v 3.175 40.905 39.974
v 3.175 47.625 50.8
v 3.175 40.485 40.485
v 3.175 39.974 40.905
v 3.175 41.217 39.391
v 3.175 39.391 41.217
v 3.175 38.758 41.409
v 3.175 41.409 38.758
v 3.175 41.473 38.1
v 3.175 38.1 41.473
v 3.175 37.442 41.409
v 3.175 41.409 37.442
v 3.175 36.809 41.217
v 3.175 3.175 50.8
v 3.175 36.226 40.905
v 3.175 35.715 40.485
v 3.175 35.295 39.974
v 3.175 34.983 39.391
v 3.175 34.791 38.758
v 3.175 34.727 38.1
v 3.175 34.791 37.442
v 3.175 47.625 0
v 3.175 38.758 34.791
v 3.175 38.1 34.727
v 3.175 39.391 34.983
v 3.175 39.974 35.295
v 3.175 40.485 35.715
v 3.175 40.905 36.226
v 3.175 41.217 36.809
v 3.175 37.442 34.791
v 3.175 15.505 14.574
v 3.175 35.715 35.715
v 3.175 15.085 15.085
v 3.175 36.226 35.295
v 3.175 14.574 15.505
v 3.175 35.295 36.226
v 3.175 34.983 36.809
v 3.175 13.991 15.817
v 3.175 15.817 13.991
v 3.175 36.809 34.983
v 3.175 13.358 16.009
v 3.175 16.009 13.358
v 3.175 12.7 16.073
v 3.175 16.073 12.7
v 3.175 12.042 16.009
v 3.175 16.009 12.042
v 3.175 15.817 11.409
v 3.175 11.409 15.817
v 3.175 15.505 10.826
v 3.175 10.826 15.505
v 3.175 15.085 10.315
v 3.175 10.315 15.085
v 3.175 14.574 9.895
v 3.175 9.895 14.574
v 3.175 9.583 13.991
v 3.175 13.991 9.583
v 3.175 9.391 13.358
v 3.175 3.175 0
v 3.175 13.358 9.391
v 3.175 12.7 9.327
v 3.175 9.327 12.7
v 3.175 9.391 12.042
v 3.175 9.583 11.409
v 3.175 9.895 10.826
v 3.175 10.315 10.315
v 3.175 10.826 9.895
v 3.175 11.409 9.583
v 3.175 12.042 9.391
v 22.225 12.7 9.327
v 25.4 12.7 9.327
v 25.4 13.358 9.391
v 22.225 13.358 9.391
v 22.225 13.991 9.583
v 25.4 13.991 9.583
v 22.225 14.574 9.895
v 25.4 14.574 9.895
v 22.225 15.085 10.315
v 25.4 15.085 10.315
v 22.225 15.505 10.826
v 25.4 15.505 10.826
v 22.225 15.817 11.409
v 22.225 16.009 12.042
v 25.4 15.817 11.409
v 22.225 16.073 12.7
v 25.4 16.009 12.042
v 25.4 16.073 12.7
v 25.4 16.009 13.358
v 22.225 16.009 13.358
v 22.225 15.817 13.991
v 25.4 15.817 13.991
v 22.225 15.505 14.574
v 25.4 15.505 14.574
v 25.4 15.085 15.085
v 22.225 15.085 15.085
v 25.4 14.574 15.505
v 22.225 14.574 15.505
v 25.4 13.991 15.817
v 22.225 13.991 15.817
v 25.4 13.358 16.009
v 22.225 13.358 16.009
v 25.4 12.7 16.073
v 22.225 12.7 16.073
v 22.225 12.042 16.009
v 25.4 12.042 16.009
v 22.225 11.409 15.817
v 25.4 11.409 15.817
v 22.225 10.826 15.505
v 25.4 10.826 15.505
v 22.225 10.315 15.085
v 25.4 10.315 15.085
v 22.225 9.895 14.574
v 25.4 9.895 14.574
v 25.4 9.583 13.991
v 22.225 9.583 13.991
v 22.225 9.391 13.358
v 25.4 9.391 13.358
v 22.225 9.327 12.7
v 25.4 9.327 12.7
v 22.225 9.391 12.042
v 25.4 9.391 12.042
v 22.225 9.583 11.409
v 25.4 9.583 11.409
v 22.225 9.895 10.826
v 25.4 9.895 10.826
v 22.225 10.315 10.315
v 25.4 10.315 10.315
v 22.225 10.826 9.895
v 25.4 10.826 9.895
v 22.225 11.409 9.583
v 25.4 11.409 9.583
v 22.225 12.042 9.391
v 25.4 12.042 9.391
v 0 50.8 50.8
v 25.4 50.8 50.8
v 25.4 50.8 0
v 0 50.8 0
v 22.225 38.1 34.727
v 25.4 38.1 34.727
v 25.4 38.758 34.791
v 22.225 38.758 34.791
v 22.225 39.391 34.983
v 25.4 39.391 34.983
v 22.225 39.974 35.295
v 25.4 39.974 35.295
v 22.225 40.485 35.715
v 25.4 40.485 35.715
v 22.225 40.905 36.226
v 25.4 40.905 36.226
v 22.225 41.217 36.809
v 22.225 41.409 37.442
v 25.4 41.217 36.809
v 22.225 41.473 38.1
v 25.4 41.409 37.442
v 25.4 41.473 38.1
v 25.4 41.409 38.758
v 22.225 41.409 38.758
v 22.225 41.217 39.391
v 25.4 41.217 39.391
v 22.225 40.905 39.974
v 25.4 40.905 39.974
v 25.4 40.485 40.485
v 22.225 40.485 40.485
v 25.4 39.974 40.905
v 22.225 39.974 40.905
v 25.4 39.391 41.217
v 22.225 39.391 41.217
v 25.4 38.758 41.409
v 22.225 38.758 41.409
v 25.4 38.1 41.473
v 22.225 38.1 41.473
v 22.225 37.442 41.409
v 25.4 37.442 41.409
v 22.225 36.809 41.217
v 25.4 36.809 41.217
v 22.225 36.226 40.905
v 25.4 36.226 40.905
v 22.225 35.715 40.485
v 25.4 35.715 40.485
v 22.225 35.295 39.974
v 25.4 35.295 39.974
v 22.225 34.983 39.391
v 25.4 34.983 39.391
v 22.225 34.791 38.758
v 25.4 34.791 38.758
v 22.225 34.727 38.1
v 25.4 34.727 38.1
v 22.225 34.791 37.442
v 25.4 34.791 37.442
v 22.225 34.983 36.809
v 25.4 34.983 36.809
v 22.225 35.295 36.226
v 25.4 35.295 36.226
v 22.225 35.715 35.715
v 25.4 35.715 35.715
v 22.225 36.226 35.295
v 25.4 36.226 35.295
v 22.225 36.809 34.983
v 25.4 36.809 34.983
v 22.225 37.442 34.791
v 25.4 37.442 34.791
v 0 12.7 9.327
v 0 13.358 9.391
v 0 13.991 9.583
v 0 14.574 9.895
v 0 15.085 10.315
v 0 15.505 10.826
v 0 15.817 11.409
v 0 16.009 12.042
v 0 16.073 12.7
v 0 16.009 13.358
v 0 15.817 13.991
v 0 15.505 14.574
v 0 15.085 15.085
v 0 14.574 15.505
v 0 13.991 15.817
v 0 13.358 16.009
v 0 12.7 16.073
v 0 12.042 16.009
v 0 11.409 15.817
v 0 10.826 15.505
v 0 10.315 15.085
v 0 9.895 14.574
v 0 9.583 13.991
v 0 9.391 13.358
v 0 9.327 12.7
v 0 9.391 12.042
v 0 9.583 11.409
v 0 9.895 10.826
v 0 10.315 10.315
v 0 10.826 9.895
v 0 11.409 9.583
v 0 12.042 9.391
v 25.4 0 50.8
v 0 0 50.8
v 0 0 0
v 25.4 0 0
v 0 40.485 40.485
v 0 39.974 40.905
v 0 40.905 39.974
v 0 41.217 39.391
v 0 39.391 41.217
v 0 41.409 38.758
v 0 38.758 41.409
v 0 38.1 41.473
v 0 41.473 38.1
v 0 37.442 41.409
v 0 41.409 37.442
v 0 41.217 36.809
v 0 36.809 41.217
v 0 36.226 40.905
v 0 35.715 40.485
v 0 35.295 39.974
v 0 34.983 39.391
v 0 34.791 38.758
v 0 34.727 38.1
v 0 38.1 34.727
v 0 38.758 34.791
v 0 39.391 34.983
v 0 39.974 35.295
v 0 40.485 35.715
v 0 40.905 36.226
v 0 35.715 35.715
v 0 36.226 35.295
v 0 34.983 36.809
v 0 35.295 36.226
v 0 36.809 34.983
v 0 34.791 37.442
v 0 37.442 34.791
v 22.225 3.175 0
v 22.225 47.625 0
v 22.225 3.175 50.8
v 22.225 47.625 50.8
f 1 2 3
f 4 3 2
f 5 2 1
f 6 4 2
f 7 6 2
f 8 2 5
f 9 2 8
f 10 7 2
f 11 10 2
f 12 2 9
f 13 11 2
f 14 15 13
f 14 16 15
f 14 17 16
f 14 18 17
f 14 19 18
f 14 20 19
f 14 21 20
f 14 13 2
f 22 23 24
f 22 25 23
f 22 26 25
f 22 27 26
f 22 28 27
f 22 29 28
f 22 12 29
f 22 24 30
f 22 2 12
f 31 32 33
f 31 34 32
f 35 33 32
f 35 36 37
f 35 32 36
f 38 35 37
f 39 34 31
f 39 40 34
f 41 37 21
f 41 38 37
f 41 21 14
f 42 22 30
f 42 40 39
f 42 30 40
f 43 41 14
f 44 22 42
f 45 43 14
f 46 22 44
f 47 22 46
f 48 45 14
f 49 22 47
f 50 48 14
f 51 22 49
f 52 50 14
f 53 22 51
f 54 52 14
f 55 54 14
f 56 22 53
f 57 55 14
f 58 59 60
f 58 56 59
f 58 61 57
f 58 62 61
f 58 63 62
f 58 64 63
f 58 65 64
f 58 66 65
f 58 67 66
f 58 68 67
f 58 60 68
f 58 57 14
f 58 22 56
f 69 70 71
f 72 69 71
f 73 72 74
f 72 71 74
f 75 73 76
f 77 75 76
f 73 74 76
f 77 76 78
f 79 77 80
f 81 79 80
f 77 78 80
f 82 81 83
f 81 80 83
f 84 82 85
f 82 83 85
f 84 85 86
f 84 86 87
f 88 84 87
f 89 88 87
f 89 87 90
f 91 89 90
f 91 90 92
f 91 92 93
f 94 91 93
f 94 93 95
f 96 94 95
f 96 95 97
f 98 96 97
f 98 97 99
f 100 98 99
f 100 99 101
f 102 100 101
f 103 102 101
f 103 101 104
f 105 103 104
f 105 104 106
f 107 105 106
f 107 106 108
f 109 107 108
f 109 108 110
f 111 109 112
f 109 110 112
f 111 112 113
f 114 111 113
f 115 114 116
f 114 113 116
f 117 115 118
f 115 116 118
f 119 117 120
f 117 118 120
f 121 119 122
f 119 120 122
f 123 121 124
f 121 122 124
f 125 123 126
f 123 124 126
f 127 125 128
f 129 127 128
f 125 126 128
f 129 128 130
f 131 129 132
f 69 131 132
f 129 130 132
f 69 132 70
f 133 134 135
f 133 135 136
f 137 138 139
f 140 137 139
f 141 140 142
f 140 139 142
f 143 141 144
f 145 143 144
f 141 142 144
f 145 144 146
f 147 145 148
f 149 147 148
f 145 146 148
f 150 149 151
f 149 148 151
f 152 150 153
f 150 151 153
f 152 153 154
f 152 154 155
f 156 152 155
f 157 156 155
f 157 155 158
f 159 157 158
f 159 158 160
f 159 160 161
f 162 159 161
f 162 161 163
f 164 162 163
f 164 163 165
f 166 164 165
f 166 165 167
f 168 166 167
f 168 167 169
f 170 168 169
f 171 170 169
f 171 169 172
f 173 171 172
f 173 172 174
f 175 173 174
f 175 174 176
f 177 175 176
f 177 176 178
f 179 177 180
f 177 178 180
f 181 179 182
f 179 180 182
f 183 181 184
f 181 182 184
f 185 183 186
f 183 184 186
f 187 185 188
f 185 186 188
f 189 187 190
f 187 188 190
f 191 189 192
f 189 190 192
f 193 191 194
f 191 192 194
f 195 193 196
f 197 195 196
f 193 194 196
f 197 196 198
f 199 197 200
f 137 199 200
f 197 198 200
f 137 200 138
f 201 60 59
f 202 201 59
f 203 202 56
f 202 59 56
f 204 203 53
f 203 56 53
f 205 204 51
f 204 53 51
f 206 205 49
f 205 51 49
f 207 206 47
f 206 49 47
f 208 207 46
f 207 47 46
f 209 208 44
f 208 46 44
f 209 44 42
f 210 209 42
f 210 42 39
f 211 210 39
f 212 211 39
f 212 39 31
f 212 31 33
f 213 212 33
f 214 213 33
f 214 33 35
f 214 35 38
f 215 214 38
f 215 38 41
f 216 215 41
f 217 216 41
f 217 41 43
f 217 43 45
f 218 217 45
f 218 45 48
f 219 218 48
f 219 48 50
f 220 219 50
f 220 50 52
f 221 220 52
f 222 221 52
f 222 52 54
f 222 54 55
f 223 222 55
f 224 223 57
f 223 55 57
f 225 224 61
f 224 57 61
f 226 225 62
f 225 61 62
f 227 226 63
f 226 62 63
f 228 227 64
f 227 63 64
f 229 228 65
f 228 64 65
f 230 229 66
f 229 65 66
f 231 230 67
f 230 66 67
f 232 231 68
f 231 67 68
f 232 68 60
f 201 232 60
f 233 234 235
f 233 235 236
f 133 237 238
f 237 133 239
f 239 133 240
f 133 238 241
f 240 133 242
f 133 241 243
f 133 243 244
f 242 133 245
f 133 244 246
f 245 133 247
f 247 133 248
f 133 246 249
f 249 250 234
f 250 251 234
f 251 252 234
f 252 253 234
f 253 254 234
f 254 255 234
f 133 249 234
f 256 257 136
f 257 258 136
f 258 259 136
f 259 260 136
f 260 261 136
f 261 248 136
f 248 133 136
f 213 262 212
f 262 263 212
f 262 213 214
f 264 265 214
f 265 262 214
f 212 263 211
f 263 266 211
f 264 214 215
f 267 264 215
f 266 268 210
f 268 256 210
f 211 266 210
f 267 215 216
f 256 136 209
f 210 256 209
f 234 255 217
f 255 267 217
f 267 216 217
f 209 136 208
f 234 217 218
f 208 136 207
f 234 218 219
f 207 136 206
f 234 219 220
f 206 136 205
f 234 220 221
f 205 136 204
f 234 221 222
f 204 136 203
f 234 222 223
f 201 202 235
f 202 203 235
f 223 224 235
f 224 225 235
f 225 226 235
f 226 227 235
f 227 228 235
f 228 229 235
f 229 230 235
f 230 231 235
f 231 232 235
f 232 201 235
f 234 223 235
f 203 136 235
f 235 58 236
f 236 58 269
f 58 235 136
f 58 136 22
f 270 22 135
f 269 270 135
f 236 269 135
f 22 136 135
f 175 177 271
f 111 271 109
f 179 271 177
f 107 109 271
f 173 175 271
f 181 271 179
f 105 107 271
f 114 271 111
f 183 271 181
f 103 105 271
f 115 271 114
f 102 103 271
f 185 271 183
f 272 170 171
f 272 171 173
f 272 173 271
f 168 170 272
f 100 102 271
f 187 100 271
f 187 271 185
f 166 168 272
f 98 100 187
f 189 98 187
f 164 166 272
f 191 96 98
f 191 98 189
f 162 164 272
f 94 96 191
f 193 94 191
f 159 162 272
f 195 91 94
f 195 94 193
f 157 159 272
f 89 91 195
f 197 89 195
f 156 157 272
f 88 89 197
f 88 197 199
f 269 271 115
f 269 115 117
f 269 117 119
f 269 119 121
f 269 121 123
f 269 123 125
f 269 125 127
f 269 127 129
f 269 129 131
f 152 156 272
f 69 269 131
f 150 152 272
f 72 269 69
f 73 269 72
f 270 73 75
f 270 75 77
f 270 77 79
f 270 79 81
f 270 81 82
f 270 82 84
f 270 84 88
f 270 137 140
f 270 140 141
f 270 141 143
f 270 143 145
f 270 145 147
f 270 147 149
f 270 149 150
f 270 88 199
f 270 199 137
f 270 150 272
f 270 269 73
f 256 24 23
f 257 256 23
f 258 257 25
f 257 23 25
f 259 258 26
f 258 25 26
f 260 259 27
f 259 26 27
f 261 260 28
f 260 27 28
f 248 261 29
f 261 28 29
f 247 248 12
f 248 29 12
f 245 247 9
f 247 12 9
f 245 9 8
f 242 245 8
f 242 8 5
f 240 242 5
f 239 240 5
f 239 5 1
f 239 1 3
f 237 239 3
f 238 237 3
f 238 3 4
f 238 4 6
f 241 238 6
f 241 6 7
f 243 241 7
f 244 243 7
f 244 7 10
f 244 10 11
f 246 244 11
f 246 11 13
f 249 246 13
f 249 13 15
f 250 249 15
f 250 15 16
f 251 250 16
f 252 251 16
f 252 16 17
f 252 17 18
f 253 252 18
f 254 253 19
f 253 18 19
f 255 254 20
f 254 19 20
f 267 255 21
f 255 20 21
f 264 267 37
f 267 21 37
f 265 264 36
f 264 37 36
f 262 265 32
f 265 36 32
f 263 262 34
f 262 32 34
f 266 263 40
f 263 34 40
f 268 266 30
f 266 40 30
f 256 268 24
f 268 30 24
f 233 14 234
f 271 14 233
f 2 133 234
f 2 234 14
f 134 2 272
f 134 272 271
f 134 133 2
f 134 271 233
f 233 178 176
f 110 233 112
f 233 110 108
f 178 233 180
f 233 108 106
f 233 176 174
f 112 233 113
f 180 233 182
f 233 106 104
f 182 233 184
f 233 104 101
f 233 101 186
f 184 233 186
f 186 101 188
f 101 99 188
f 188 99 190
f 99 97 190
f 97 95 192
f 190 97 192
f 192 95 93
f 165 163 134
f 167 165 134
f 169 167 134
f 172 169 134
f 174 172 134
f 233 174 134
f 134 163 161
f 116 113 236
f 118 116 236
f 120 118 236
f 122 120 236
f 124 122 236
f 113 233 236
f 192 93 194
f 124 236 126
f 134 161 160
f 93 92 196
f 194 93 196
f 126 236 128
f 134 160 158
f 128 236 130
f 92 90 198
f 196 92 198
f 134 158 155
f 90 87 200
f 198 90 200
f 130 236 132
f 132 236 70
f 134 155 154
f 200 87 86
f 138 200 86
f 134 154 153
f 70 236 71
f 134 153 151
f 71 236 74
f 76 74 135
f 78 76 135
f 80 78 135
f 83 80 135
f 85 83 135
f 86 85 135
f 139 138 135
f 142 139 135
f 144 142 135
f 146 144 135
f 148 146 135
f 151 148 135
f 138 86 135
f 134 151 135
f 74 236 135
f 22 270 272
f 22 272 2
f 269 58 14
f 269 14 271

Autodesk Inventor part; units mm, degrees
ref_plane "YZ Plane" through (0, 0, 0) normal (1, 0, 0) x (0, 1, 0)
ref_plane "XZ Plane" through (0, 0, 0) normal (0, 1, 0) x (-1, 0, 0)
ref_plane "XY Plane" through (0, 0, 0) normal (0, 0, 1) x (1, 0, 0)
sketch "Sketch1" plane through (0, 0, 0) normal (0, 0, 1) x (1, 0, 0)
  line L0 (0, 0) -> (25.4, 0)
  line L1 (25.4, 0) -> (25.4, 50.8)
  line L2 (25.4, 50.8) -> (0, 50.8)
  line L3 (0, 50.8) -> (0, 0)
  line L4 (3.175, 3.175) -> (22.225, 3.175)
  line L5 (22.225, 3.175) -> (22.225, 47.625)
  line L6 (22.225, 47.625) -> (3.175, 47.625)
  line L7 (3.175, 47.625) -> (3.175, 3.175)
  dimension "d0" = 25.4
  dimension "d1" = 50.8
  dimension "d2" = 3.175
extrude "Extrusion1" add sketch "Sketch1" along normal blind 50.8
sketch "Sketch2" plane through (25.4, 0, 0) normal (1, 0, 0) x (0, 0, -1)
  circle A0 centre (-38.1, 38.1) radius 3.3734
  circle A1 centre (-12.7, 12.7) radius 3.3734
  line L0 (-50.8, 0) -> (-50.8, 50.8) projected
  line L1 (0, 50.8) -> (-50.8, 50.8) projected
  line L2 (0, 0) -> (0, 50.8) projected
  line L3 (0, 0) -> (-50.8, 0) projected
  dimension "d5" = 6.7469
  dimension "d6" = 6.7469
  dimension "d7" = 12.7
  dimension "d8" = 12.7
  dimension "d9" = 12.7
  dimension "d10" = 12.7
extrude "Extrusion2" cut sketch "Sketch2" against normal blind 25.4 contours A0 | A1
properties part number "2nd flywheel block"
